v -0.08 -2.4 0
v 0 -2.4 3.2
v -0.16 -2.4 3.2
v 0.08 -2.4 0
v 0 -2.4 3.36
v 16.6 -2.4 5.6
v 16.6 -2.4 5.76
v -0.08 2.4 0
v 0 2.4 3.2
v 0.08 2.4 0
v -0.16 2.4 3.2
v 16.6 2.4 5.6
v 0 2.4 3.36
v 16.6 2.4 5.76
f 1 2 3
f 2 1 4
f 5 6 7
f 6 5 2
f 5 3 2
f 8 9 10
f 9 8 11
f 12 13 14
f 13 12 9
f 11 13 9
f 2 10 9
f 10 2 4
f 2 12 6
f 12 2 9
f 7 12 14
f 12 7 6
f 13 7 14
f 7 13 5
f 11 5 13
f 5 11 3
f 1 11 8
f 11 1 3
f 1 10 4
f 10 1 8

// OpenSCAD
// file: ../p/4-4edge.scad
use <../lib.scad>
$fa=1; $fs=0.2;
function ldraw_lib__4_4edge(realsolid=false) = [
// 0 Circle 1.0
// 0 Name: 4-4edge.dat
// 0 Author: James Jessiman
// 0 !LDRAW_ORG Primitive UPDATE 2017-01
// 0 !LICENSE Licensed under CC BY 2.0 and CC BY 4.0 : see CAreadme.txt
// 
// 0 BFC CERTIFY CCW
  [0,"BFC","CERTIFY"],
  [0,"BFC","CCW"],
// 
// 0 !HISTORY 1998-12-15 [PTadmin] Official Update 1998-10
// 0 !HISTORY 2005-12-28 [PTadmin] Official Update 2005-01
// 0 !HISTORY 2007-06-24 [PTadmin] Header formatted for Contributor Agreement
// 0 !HISTORY 2008-07-01 [PTadmin] Official Update 2008-01
// 0 !HISTORY 2017-01-15 [Steffen] BFCed
// 0 !HISTORY 2017-12-30 [PTadmin] Official Update 2017-01
// 
// 
// 2 24 1 0 0 0.9239 0 0.3827
  [2,24,1,0,0,0.9239,0,0.3827],
// 2 24 0.9239 0 0.3827 0.7071 0 0.7071
  [2,24,0.9239,0,0.3827,0.7071,0,0.7071],
// 2 24 0.7071 0 0.7071 0.3827 0 0.9239
  [2,24,0.7071,0,0.7071,0.3827,0,0.9239],
// 2 24 0.3827 0 0.9239 0 0 1
  [2,24,0.3827,0,0.9239,0,0,1],
// 2 24 0 0 1 -0.3827 0 0.9239
  [2,24,0,0,1,-0.3827,0,0.9239],
// 2 24 -0.3827 0 0.9239 -0.7071 0 0.7071
  [2,24,-0.3827,0,0.9239,-0.7071,0,0.7071],
// 2 24 -0.7071 0 0.7071 -0.9239 0 0.3827
  [2,24,-0.7071,0,0.7071,-0.9239,0,0.3827],
// 2 24 -0.9239 0 0.3827 -1 0 -0
  [2,24,-0.9239,0,0.3827,-1,0,-0],
// 2 24 -1 0 -0 -0.9239 0 -0.3827
  [2,24,-1,0,-0,-0.9239,0,-0.3827],
// 2 24 -0.9239 0 -0.3827 -0.7071 0 -0.7071
  [2,24,-0.9239,0,-0.3827,-0.7071,0,-0.7071],
// 2 24 -0.7071 0 -0.7071 -0.3827 0 -0.9239
  [2,24,-0.7071,0,-0.7071,-0.3827,0,-0.9239],
// 2 24 -0.3827 0 -0.9239 0 0 -1
  [2,24,-0.3827,0,-0.9239,0,0,-1],
// 2 24 0 0 -1 0.3827 0 -0.9239
  [2,24,0,0,-1,0.3827,0,-0.9239],
// 2 24 0.3827 0 -0.9239 0.7071 0 -0.7071
  [2,24,0.3827,0,-0.9239,0.7071,0,-0.7071],
// 2 24 0.7071 0 -0.7071 0.9239 0 -0.3827
  [2,24,0.7071,0,-0.7071,0.9239,0,-0.3827],
// 2 24 0.9239 0 -0.3827 1 0 0
  [2,24,0.9239,0,-0.3827,1,0,0],
];
module ldraw_lib__4_4edge(step=0, col=false, unit=2/5, alt=false, line=0.2, solid=!$preview)
    makepoly(ldraw_lib__4_4edge(solid), step=step, col=col, unit=unit, alt=alt, line=line, solid=solid);
ldraw_lib__4_4edge(line=0.2);
// file: ../p/4-4disc.scad
use <../lib.scad>
$fa=1; $fs=0.2;
function ldraw_lib__4_4disc(realsolid=false) = [
// 0 Disc 1.0
// 0 Name: 4-4disc.dat
// 0 Author: James Jessiman
// 0 !LDRAW_ORG Primitive UPDATE 2002-02
// 0 !LICENSE Licensed under CC BY 2.0 and CC BY 4.0 : see CAreadme.txt
// 
// 0 BFC CERTIFY CCW
  [0,"BFC","CERTIFY"],
  [0,"BFC","CCW"],
// 
// 0 !HISTORY 1998-12-15 [PTadmin] Official Update 1998-10
// 0 !HISTORY 2002-03-23 [sbliss] Added BFC statement
// 0 !HISTORY 2002-04-25 [PTadmin] Official Update 2002-02
// 0 !HISTORY 2007-06-24 [PTadmin] Header formatted for Contributor Agreement
// 0 !HISTORY 2008-07-01 [PTadmin] Official Update 2008-01
// 
// 
// 3 16 0 0 0 1 0 0 0.9239 0 0.3827
  [3,16,0,0,0,1,0,0,0.9239,0,0.3827],
// 3 16 0 0 0 0.9239 0 0.3827 0.7071 0 0.7071
  [3,16,0,0,0,0.9239,0,0.3827,0.7071,0,0.7071],
// 3 16 0 0 0 0.7071 0 0.7071 0.3827 0 0.9239
  [3,16,0,0,0,0.7071,0,0.7071,0.3827,0,0.9239],
// 3 16 0 0 0 0.3827 0 0.9239 0 0 1
  [3,16,0,0,0,0.3827,0,0.9239,0,0,1],
// 3 16 0 0 0 0 0 1 -0.3827 0 0.9239
  [3,16,0,0,0,0,0,1,-0.3827,0,0.9239],
// 3 16 0 0 0 -0.3827 0 0.9239 -0.7071 0 0.7071
  [3,16,0,0,0,-0.3827,0,0.9239,-0.7071,0,0.7071],
// 3 16 0 0 0 -0.7071 0 0.7071 -0.9239 0 0.3827
  [3,16,0,0,0,-0.7071,0,0.7071,-0.9239,0,0.3827],
// 3 16 0 0 0 -0.9239 0 0.3827 -1 0 -0
  [3,16,0,0,0,-0.9239,0,0.3827,-1,0,-0],
// 3 16 0 0 0 -1 0 -0 -0.9239 0 -0.3827
  [3,16,0,0,0,-1,0,-0,-0.9239,0,-0.3827],
// 3 16 0 0 0 -0.9239 0 -0.3827 -0.7071 0 -0.7071
  [3,16,0,0,0,-0.9239,0,-0.3827,-0.7071,0,-0.7071],
// 3 16 0 0 0 -0.7071 0 -0.7071 -0.3827 0 -0.9239
  [3,16,0,0,0,-0.7071,0,-0.7071,-0.3827,0,-0.9239],
// 3 16 0 0 0 -0.3827 0 -0.9239 0 0 -1
  [3,16,0,0,0,-0.3827,0,-0.9239,0,0,-1],
// 3 16 0 0 0 0 0 -1 0.3827 0 -0.9239
  [3,16,0,0,0,0,0,-1,0.3827,0,-0.9239],
// 3 16 0 0 0 0.3827 0 -0.9239 0.7071 0 -0.7071
  [3,16,0,0,0,0.3827,0,-0.9239,0.7071,0,-0.7071],
// 3 16 0 0 0 0.7071 0 -0.7071 0.9239 0 -0.3827
  [3,16,0,0,0,0.7071,0,-0.7071,0.9239,0,-0.3827],
// 3 16 0 0 0 0.9239 0 -0.3827 1 0 0
  [3,16,0,0,0,0.9239,0,-0.3827,1,0,0],
// 0
];
module ldraw_lib__4_4disc(step=0, col=false, unit=2/5, alt=false, line=0.2, solid=!$preview)
    makepoly(ldraw_lib__4_4disc(solid), step=step, col=col, unit=unit, alt=alt, line=line, solid=solid);
ldraw_lib__4_4disc(line=0.2);
// file: ../p/4-4cyli.scad
use <../lib.scad>
$fa=1; $fs=0.2;
function ldraw_lib__4_4cyli(realsolid=false) = [
// 0 Cylinder 1.0
// 0 Name: 4-4cyli.dat
// 0 Author: James Jessiman
// 0 !LDRAW_ORG Primitive UPDATE 2005-01
// 0 !LICENSE Licensed under CC BY 2.0 and CC BY 4.0 : see CAreadme.txt
// 
// 0 BFC CERTIFY CCW
  [0,"BFC","CERTIFY"],
  [0,"BFC","CCW"],
// 
// 0 !HISTORY 1998-12-15 [PTadmin] Official Update 1998-10
// 0 !HISTORY 2002-03-23 [sbliss] Added BFC statement; merged headers from files in distributions LDraw 0.27 and Complete.
// 0 !HISTORY 2002-04-25 [PTadmin] Official Update 2002-02
// 0 !HISTORY 2004-12-14 [guyvivan] BFC CCW
// 0 !HISTORY 2005-12-28 [PTadmin] Official Update 2005-01
// 0 !HISTORY 2007-06-24 [PTadmin] Header formatted for Contributor Agreement
// 0 !HISTORY 2008-07-01 [PTadmin] Official Update 2008-01
// 
// 
// 4 16 1 1 0 0.9239 1 0.3827 0.9239 0 0.3827 1 0 0
  [4,16,1,1,0,0.9239,1,0.3827,0.9239,0,0.3827,1,0,0],
// 5 24 1 0 0 1 1 0 0.9239 0 0.3827 0.9239 0 -0.3827
  [5,24,1,0,0,1,1,0,0.9239,0,0.3827,0.9239,0,-0.3827],
// 4 16 0.9239 1 0.3827 0.7071 1 0.7071 0.7071 0 0.7071 0.9239 0 0.3827
  [4,16,0.9239,1,0.3827,0.7071,1,0.7071,0.7071,0,0.7071,0.9239,0,0.3827],
// 5 24 0.9239 0 0.3827 0.9239 1 0.3827 0.7071 0 0.7071 1 0 0
  [5,24,0.9239,0,0.3827,0.9239,1,0.3827,0.7071,0,0.7071,1,0,0],
// 4 16 0.7071 1 0.7071 0.3827 1 0.9239 0.3827 0 0.9239 0.7071 0 0.7071
  [4,16,0.7071,1,0.7071,0.3827,1,0.9239,0.3827,0,0.9239,0.7071,0,0.7071],
// 5 24 0.7071 0 0.7071 0.7071 1 0.7071 0.3827 0 0.9239 0.9239 0 0.3827
  [5,24,0.7071,0,0.7071,0.7071,1,0.7071,0.3827,0,0.9239,0.9239,0,0.3827],
// 4 16 0.3827 1 0.9239 0 1 1 0 0 1 0.3827 0 0.9239
  [4,16,0.3827,1,0.9239,0,1,1,0,0,1,0.3827,0,0.9239],
// 5 24 0.3827 0 0.9239 0.3827 1 0.9239 0 0 1 0.7071 0 0.7071
  [5,24,0.3827,0,0.9239,0.3827,1,0.9239,0,0,1,0.7071,0,0.7071],
// 4 16 0 1 1 -0.3827 1 0.9239 -0.3827 0 0.9239 0 0 1
  [4,16,0,1,1,-0.3827,1,0.9239,-0.3827,0,0.9239,0,0,1],
// 5 24 0 0 1 0 1 1 -0.3827 0 0.9239 0.3827 0 0.9239
  [5,24,0,0,1,0,1,1,-0.3827,0,0.9239,0.3827,0,0.9239],
// 4 16 -0.3827 1 0.9239 -0.7071 1 0.7071 -0.7071 0 0.7071 -0.3827 0 0.9239
  [4,16,-0.3827,1,0.9239,-0.7071,1,0.7071,-0.7071,0,0.7071,-0.3827,0,0.9239],
// 5 24 -0.3827 0 0.9239 -0.3827 1 0.9239 -0.7071 0 0.7071 0 0 1
  [5,24,-0.3827,0,0.9239,-0.3827,1,0.9239,-0.7071,0,0.7071,0,0,1],
// 4 16 -0.7071 1 0.7071 -0.9239 1 0.3827 -0.9239 0 0.3827 -0.7071 0 0.7071
  [4,16,-0.7071,1,0.7071,-0.9239,1,0.3827,-0.9239,0,0.3827,-0.7071,0,0.7071],
// 5 24 -0.7071 0 0.7071 -0.7071 1 0.7071 -0.9239 0 0.3827 -0.3827 0 0.9239
  [5,24,-0.7071,0,0.7071,-0.7071,1,0.7071,-0.9239,0,0.3827,-0.3827,0,0.9239],
// 4 16 -0.9239 1 0.3827 -1 1 0 -1 0 0 -0.9239 0 0.3827
  [4,16,-0.9239,1,0.3827,-1,1,0,-1,0,0,-0.9239,0,0.3827],
// 5 24 -0.9239 0 0.3827 -0.9239 1 0.3827 -1 0 0 -0.7071 0 0.7071
  [5,24,-0.9239,0,0.3827,-0.9239,1,0.3827,-1,0,0,-0.7071,0,0.7071],
// 4 16 -1 1 0 -0.9239 1 -0.3827 -0.9239 0 -0.3827 -1 0 0
  [4,16,-1,1,0,-0.9239,1,-0.3827,-0.9239,0,-0.3827,-1,0,0],
// 5 24 -1 0 0 -1 1 0 -0.9239 0 -0.3827 -0.9239 0 0.3827
  [5,24,-1,0,0,-1,1,0,-0.9239,0,-0.3827,-0.9239,0,0.3827],
// 4 16 -0.9239 1 -0.3827 -0.7071 1 -0.7071 -0.7071 0 -0.7071 -0.9239 0 -0.3827
  [4,16,-0.9239,1,-0.3827,-0.7071,1,-0.7071,-0.7071,0,-0.7071,-0.9239,0,-0.3827],
// 5 24 -0.9239 0 -0.3827 -0.9239 1 -0.3827 -0.7071 0 -0.7071 -1 0 0
  [5,24,-0.9239,0,-0.3827,-0.9239,1,-0.3827,-0.7071,0,-0.7071,-1,0,0],
// 4 16 -0.7071 1 -0.7071 -0.3827 1 -0.9239 -0.3827 0 -0.9239 -0.7071 0 -0.7071
  [4,16,-0.7071,1,-0.7071,-0.3827,1,-0.9239,-0.3827,0,-0.9239,-0.7071,0,-0.7071],
// 5 24 -0.7071 0 -0.7071 -0.7071 1 -0.7071 -0.3827 0 -0.9239 -0.9239 0 -0.3827
  [5,24,-0.7071,0,-0.7071,-0.7071,1,-0.7071,-0.3827,0,-0.9239,-0.9239,0,-0.3827],
// 4 16 -0.3827 1 -0.9239 0 1 -1 0 0 -1 -0.3827 0 -0.9239
  [4,16,-0.3827,1,-0.9239,0,1,-1,0,0,-1,-0.3827,0,-0.9239],
// 5 24 -0.3827 0 -0.9239 -0.3827 1 -0.9239 0 0 -1 -0.7071 0 -0.7071
  [5,24,-0.3827,0,-0.9239,-0.3827,1,-0.9239,0,0,-1,-0.7071,0,-0.7071],
// 4 16 0 1 -1 0.3827 1 -0.9239 0.3827 0 -0.9239 0 0 -1
  [4,16,0,1,-1,0.3827,1,-0.9239,0.3827,0,-0.9239,0,0,-1],
// 5 24 0 0 -1 0 1 -1 0.3827 0 -0.9239 -0.3827 0 -0.9239
  [5,24,0,0,-1,0,1,-1,0.3827,0,-0.9239,-0.3827,0,-0.9239],
// 4 16 0.3827 1 -0.9239 0.7071 1 -0.7071 0.7071 0 -0.7071 0.3827 0 -0.9239
  [4,16,0.3827,1,-0.9239,0.7071,1,-0.7071,0.7071,0,-0.7071,0.3827,0,-0.9239],
// 5 24 0.3827 0 -0.9239 0.3827 1 -0.9239 0.7071 0 -0.7071 0 0 -1
  [5,24,0.3827,0,-0.9239,0.3827,1,-0.9239,0.7071,0,-0.7071,0,0,-1],
// 4 16 0.7071 1 -0.7071 0.9239 1 -0.3827 0.9239 0 -0.3827 0.7071 0 -0.7071
  [4,16,0.7071,1,-0.7071,0.9239,1,-0.3827,0.9239,0,-0.3827,0.7071,0,-0.7071],
// 5 24 0.7071 0 -0.7071 0.7071 1 -0.7071 0.9239 0 -0.3827 0.3827 0 -0.9239
  [5,24,0.7071,0,-0.7071,0.7071,1,-0.7071,0.9239,0,-0.3827,0.3827,0,-0.9239],
// 4 16 0.9239 1 -0.3827 1 1 0 1 0 0 0.9239 0 -0.3827
  [4,16,0.9239,1,-0.3827,1,1,0,1,0,0,0.9239,0,-0.3827],
// 5 24 0.9239 0 -0.3827 0.9239 1 -0.3827 1 0 0 0.7071 0 -0.7071
  [5,24,0.9239,0,-0.3827,0.9239,1,-0.3827,1,0,0,0.7071,0,-0.7071],
// 0
];
module ldraw_lib__4_4cyli(step=0, col=false, unit=2/5, alt=false, line=0.2, solid=!$preview)
    makepoly(ldraw_lib__4_4cyli(solid), step=step, col=col, unit=unit, alt=alt, line=line, solid=solid);
ldraw_lib__4_4cyli(line=0.2);
// file: ../p/stud3.scad
use <../lib.scad>
use <4-4cyli.scad>
use <4-4disc.scad>
use <4-4edge.scad>
$fa=1; $fs=0.2;
function ldraw_lib__stud3(realsolid=false) = realsolid ? 
    [openscad(translate([0,0,-eps()], o=cylinder(4+eps(), r=4)),2)] : [
// 0 Stud Tube Solid
// 0 Name: stud3.dat
// 0 Author: James Jessiman
// 0 !LDRAW_ORG Primitive UPDATE 2012-01
// 0 !LICENSE Licensed under CC BY 2.0 and CC BY 4.0 : see CAreadme.txt
// 
// 0 BFC CERTIFY CCW
  [0,"BFC","CERTIFY"],
  [0,"BFC","CCW"],
// 
// 0 !HISTORY 2002-04-04 [sbliss] Modified for BFC compliance
// 0 !HISTORY 2002-04-25 [PTadmin] Official Update 2002-02
// 0 !HISTORY 2007-06-24 [PTadmin] Header formatted for Contributor Agreement
// 0 !HISTORY 2008-07-01 [PTadmin] Official Update 2008-01
// 0 !HISTORY 2012-02-16 [Philo] Changed to CCW
// 0 !HISTORY 2012-03-30 [PTadmin] Official Update 2012-01
// 
// 
// 1 16 0 -4 0 4 0 0 0 1 0 0 0 4 4-4edge.dat
  [1,16,0,-4,0,4,0,0,0,1,0,0,0,4, ldraw_lib__4_4edge(realsolid)],
// 1 16 0 0 0 4 0 0 0 1 0 0 0 4 4-4edge.dat
  [1,16,0,0,0,4,0,0,0,1,0,0,0,4, ldraw_lib__4_4edge(realsolid)],
// 1 16 0 -4 0 4 0 0 0 1 0 0 0 4 4-4disc.dat
  [1,16,0,-4,0,4,0,0,0,1,0,0,0,4, ldraw_lib__4_4disc(realsolid)],
// 1 16 0 -4 0 4 0 0 0 4 0 0 0 4 4-4cyli.dat
  [1,16,0,-4,0,4,0,0,0,4,0,0,0,4, ldraw_lib__4_4cyli(realsolid)],
];
module ldraw_lib__stud3(step=0, col=false, unit=2/5, alt=false, line=0.2, solid=!$preview)
    makepoly(ldraw_lib__stud3(solid), step=step, col=col, unit=unit, alt=alt, line=line, solid=solid);
ldraw_lib__stud3(line=0.2);
// file: ../p/stud.scad
use <../lib.scad>
use <4-4cyli.scad>
use <4-4disc.scad>
use <4-4edge.scad>
$fa=1; $fs=0.2;
function ldraw_lib__stud(realsolid=false) = realsolid ? 
    [openscad(translate([0,0,-eps()], o=cylinder(4+eps(), r=6)),2)] : [
// 0 Stud
// 0 Name: stud.dat
// 0 Author: James Jessiman
// 0 !LDRAW_ORG Primitive UPDATE 2012-01
// 0 !LICENSE Licensed under CC BY 2.0 and CC BY 4.0 : see CAreadme.txt
// 
// 0 BFC CERTIFY CCW
  [0,"BFC","CERTIFY"],
  [0,"BFC","CCW"],
// 
// 0 !HISTORY 2002-04-04 [sbliss] Modified for BFC compliance
// 0 !HISTORY 2002-04-25 [PTadmin] Official Update 2002-02
// 0 !HISTORY 2007-06-24 [PTadmin] Header formatted for Contributor Agreement
// 0 !HISTORY 2008-07-01 [PTadmin] Official Update 2008-01
// 0 !HISTORY 2012-02-16 [Philo] Changed to CCW
// 0 !HISTORY 2012-03-30 [PTadmin] Official Update 2012-01
// 
// 
// 1 16 0 0 0 6 0 0 0 1 0 0 0 6 4-4edge.dat
  [1,16,0,0,0,6,0,0,0,1,0,0,0,6, ldraw_lib__4_4edge(realsolid)],
// 1 16 0 -4 0 6 0 0 0 1 0 0 0 6 4-4edge.dat
  [1,16,0,-4,0,6,0,0,0,1,0,0,0,6, ldraw_lib__4_4edge(realsolid)],
// 1 16 0 0 0 6 0 0 0 -4 0 0 0 6 4-4cyli.dat
  [1,16,0,0,0,6,0,0,0,-4,0,0,0,6, ldraw_lib__4_4cyli(realsolid)],
// 1 16 0 -4 0 6 0 0 0 1 0 0 0 6 4-4disc.dat
  [1,16,0,-4,0,6,0,0,0,1,0,0,0,6, ldraw_lib__4_4disc(realsolid)],
];
module ldraw_lib__stud(step=0, col=false, unit=2/5, alt=false, line=0.2, solid=!$preview)
    makepoly(ldraw_lib__stud(solid), step=step, col=col, unit=unit, alt=alt, line=line, solid=solid);
ldraw_lib__stud(line=0.2);
// file: ../p/box5.scad
use <../lib.scad>
$fa=1; $fs=0.2;
function ldraw_lib__box5(realsolid=false) = [
// 0 Box with 5 Faces and All Edges
// 0 Name: box5.dat
// 0 Author: James Jessiman
// 0 !LDRAW_ORG Primitive UPDATE 2012-01
// 0 !LICENSE Licensed under CC BY 2.0 and CC BY 4.0 : see CAreadme.txt
// 
// 0 BFC CERTIFY CCW
  [0,"BFC","CERTIFY"],
  [0,"BFC","CCW"],
// 
// 0 !HISTORY 2002-04-03 [sbliss] Modified for BFC compliance
// 0 !HISTORY 2002-04-25 [PTadmin] Official Update 2002-02
// 0 !HISTORY 2007-06-24 [PTadmin] Header formatted for Contributor Agreement
// 0 !HISTORY 2008-07-01 [PTadmin] Official Update 2008-01
// 0 !HISTORY 2012-02-16 [Philo] Changed to CCW
// 0 !HISTORY 2012-03-30 [PTadmin] Official Update 2012-01
// 
// 
// 2 24 1 1 1 -1 1 1
  [2,24,1,1,1,-1,1,1],
// 2 24 -1 1 1 -1 1 -1
  [2,24,-1,1,1,-1,1,-1],
// 2 24 -1 1 -1 1 1 -1
  [2,24,-1,1,-1,1,1,-1],
// 2 24 1 1 -1 1 1 1
  [2,24,1,1,-1,1,1,1],
// 2 24 1 0 1 -1 0 1
  [2,24,1,0,1,-1,0,1],
// 2 24 -1 0 1 -1 0 -1
  [2,24,-1,0,1,-1,0,-1],
// 2 24 -1 0 -1 1 0 -1
  [2,24,-1,0,-1,1,0,-1],
// 2 24 1 0 -1 1 0 1
  [2,24,1,0,-1,1,0,1],
// 2 24 1 0 1 1 1 1
  [2,24,1,0,1,1,1,1],
// 2 24 -1 0 1 -1 1 1
  [2,24,-1,0,1,-1,1,1],
// 2 24 1 0 -1 1 1 -1
  [2,24,1,0,-1,1,1,-1],
// 2 24 -1 0 -1 -1 1 -1
  [2,24,-1,0,-1,-1,1,-1],
// 4 16 -1 1 1 1 1 1 1 1 -1 -1 1 -1
  [4,16,-1,1,1,1,1,1,1,1,-1,-1,1,-1],
// 4 16 -1 1 1 -1 0 1 1 0 1 1 1 1
  [4,16,-1,1,1,-1,0,1,1,0,1,1,1,1],
// 4 16 -1 1 -1 -1 0 -1 -1 0 1 -1 1 1
  [4,16,-1,1,-1,-1,0,-1,-1,0,1,-1,1,1],
// 4 16 1 1 -1 1 0 -1 -1 0 -1 -1 1 -1
  [4,16,1,1,-1,1,0,-1,-1,0,-1,-1,1,-1],
// 4 16 1 1 1 1 0 1 1 0 -1 1 1 -1
  [4,16,1,1,1,1,0,1,1,0,-1,1,1,-1],
];
module ldraw_lib__box5(step=0, col=false, unit=2/5, alt=false, line=0.2, solid=!$preview)
    makepoly(ldraw_lib__box5(solid), step=step, col=col, unit=unit, alt=alt, line=line, solid=solid);
ldraw_lib__box5(line=0.2);
// file: ../p/box4t.scad
use <../lib.scad>
$fa=1; $fs=0.2;
function ldraw_lib__box4t(realsolid=false) = [
// 0 Box with 4 Adjacent Faces and All Edges
// 0 Name: box4t.dat
// 0 Author: Tore Eriksson [Tore_Eriksson]
// 0 !LDRAW_ORG Primitive UPDATE 2003-02
// 0 !LICENSE Licensed under CC BY 2.0 and CC BY 4.0 : see CAreadme.txt
// 
// 0 BFC CERTIFY CCW
  [0,"BFC","CERTIFY"],
  [0,"BFC","CCW"],
// 
// 0 !HISTORY 1997-09-29 [PTadmin] Official Update 1997-15
// 0 !HISTORY 2002-08-31 [izanette] Modified with WINDZ for BFC compliance
// 0 !HISTORY 2003-08-01 [PTadmin] Official Update 2003-02
// 0 !HISTORY 2007-06-24 [PTadmin] Header formatted for Contributor Agreement
// 0 !HISTORY 2008-07-01 [PTadmin] Official Update 2008-01
// 
// 
// 2 24 1 1 1 -1 1 1
  [2,24,1,1,1,-1,1,1],
// 2 24 -1 1 1 -1 1 -1
  [2,24,-1,1,1,-1,1,-1],
// 2 24 -1 1 -1 1 1 -1
  [2,24,-1,1,-1,1,1,-1],
// 2 24 1 1 -1 1 1 1
  [2,24,1,1,-1,1,1,1],
// 2 24 1 0 1 -1 0 1
  [2,24,1,0,1,-1,0,1],
// 2 24 -1 0 1 -1 0 -1
  [2,24,-1,0,1,-1,0,-1],
// 2 24 -1 0 -1 1 0 -1
  [2,24,-1,0,-1,1,0,-1],
// 2 24 1 0 -1 1 0 1
  [2,24,1,0,-1,1,0,1],
// 2 24 1 0 1 1 1 1
  [2,24,1,0,1,1,1,1],
// 2 24 -1 0 1 -1 1 1
  [2,24,-1,0,1,-1,1,1],
// 2 24 1 0 -1 1 1 -1
  [2,24,1,0,-1,1,1,-1],
// 2 24 -1 0 -1 -1 1 -1
  [2,24,-1,0,-1,-1,1,-1],
// 4 16 1 1 1 1 1 -1 -1 1 -1 -1 1 1
  [4,16,1,1,1,1,1,-1,-1,1,-1,-1,1,1],
// 4 16 1 1 1 -1 1 1 -1 0 1 1 0 1
  [4,16,1,1,1,-1,1,1,-1,0,1,1,0,1],
// 4 16 -1 1 1 -1 1 -1 -1 0 -1 -1 0 1
  [4,16,-1,1,1,-1,1,-1,-1,0,-1,-1,0,1],
// 0 4 16 -1 1 -1 -1 0 -1 1 0 -1 1 1 -1
// 4 16 1 1 -1 1 1 1 1 0 1 1 0 -1
  [4,16,1,1,-1,1,1,1,1,0,1,1,0,-1],
// 0
];
module ldraw_lib__box4t(step=0, col=false, unit=2/5, alt=false, line=0.2, solid=!$preview)
    makepoly(ldraw_lib__box4t(solid), step=step, col=col, unit=unit, alt=alt, line=line, solid=solid);
ldraw_lib__box4t(line=0.2);
// file: s/3004s01.scad
use <../../lib.scad>
use <../../p/box4t.scad>
use <../../p/box5.scad>
use <../../p/stud.scad>
use <../../p/stud3.scad>
$fa=1; $fs=0.2;
function ldraw_lib__s__3004s01(realsolid=false) = [
// 0 ~Brick  1 x  2 without Front Face
// 0 Name: s\3004s01.dat
// 0 Author: James Jessiman
// 0 !LDRAW_ORG Subpart UPDATE 2003-03
// 0 !LICENSE Licensed under CC BY 2.0 and CC BY 4.0 : see CAreadme.txt
// 
// 0 BFC CERTIFY CCW
  [0,"BFC","CERTIFY"],
  [0,"BFC","CCW"],
// 
// 0 !HISTORY 2003-09-07 [jriley] Subfiling, BFC
// 0 !HISTORY 2003-12-19 [PTadmin] Official Update 2003-03
// 0 !HISTORY 2007-08-29 [PTadmin] Header formatted for Contributor Agreement
// 0 !HISTORY 2008-07-01 [PTadmin] Official Update 2008-01
// 
// 
// 1 16 0 4 0 1 0 0 0 -5 0 0 0 1 stud3.dat
  [1,16,0,4,0,1,0,0,0,-5,0,0,0,1, ldraw_lib__stud3(realsolid)],
// 0 BFC INVERTNEXT
  [0,"BFC","INVERTNEXT"],
// 1 16 0 24 0 16 0 0 0 -20 0 0 0 6 box5.dat
  [1,16,0,24,0,16,0,0,0,-20,0,0,0,6, ldraw_lib__box5(realsolid)],
// 4 16 20 24 10 16 24 6 -16 24 6 -20 24 10
  [4,16,20,24,10,16,24,6,-16,24,6,-20,24,10],
// 4 16 -20 24 10 -16 24 6 -16 24 -6 -20 24 -10
  [4,16,-20,24,10,-16,24,6,-16,24,-6,-20,24,-10],
// 4 16 -20 24 -10 -16 24 -6 16 24 -6 20 24 -10
  [4,16,-20,24,-10,-16,24,-6,16,24,-6,20,24,-10],
// 4 16 20 24 -10 16 24 -6 16 24 6 20 24 10
  [4,16,20,24,-10,16,24,-6,16,24,6,20,24,10],
// 1 16 0 24 0 20 0 0 0 -24 0 0 0 10 box4t.dat
  [1,16,0,24,0,20,0,0,0,-24,0,0,0,10, ldraw_lib__box4t(realsolid)],
// 1 16 10 0 0 1 0 0 0 1 0 0 0 1 stud.dat
  [1,16,10,0,0,1,0,0,0,1,0,0,0,1, ldraw_lib__stud(realsolid)],
// 1 16 -10 0 0 1 0 0 0 1 0 0 0 1 stud.dat
  [1,16,-10,0,0,1,0,0,0,1,0,0,0,1, ldraw_lib__stud(realsolid)],
// 0
];
module ldraw_lib__s__3004s01(step=0, col=false, unit=2/5, alt=false, line=0.2, solid=!$preview)
    makepoly(ldraw_lib__s__3004s01(solid), step=step, col=col, unit=unit, alt=alt, line=line, solid=solid);
ldraw_lib__s__3004s01(line=0.2);
// file: 3004.scad
use <../lib.scad>
use <s/3004s01.scad>
$fa=1; $fs=0.2;
function ldraw_lib__3004(realsolid=false) = [
// 0 Brick  1 x  2
// 0 Name: 3004.dat
// 0 Author: James Jessiman
// 0 !LDRAW_ORG Part UPDATE 2022-05
// 0 !LICENSE Licensed under CC BY 2.0 and CC BY 4.0 : see CAreadme.txt
// 
// 0 BFC CERTIFY CCW
  [0,"BFC","CERTIFY"],
  [0,"BFC","CCW"],
// 
// 0 !HISTORY 2001-10-26 [PTadmin] Official Update 2001-01
// 0 !HISTORY 2002-05-07 {unknown} BFC Certification
// 0 !HISTORY 2002-06-11 [PTadmin] Official Update 2002-03
// 0 !HISTORY 2007-05-07 [PTadmin] Header formatted for Contributor Agreement
// 0 !HISTORY 2008-07-01 [PTadmin] Official Update 2008-01
// 0 !HISTORY 2022-08-04 [MagFors] Using subfile
// 0 !HISTORY 2022-09-15 [PTadmin] Official Update 2022-05
// 
// 
// 1 16 0 0 0 1 0 0 0 1 0 0 0 1 s\3004s01.dat
  [1,16,0,0,0,1,0,0,0,1,0,0,0,1, ldraw_lib__s__3004s01(realsolid)],
// 4 16 -20 24 -10 20 24 -10 20 0 -10 -20 0 -10
  [4,16,-20,24,-10,20,24,-10,20,0,-10,-20,0,-10],
];
module ldraw_lib__3004(step=0, col=false, unit=2/5, alt=false, line=0.2, solid=!$preview)
    makepoly(ldraw_lib__3004(solid), step=step, col=col, unit=unit, alt=alt, line=line, solid=solid);
ldraw_lib__3004(line=0.2);
// file: ../p/rect3.scad
use <../lib.scad>
$fa=1; $fs=0.2;
function ldraw_lib__rect3(realsolid=false) = [
// 0 Rectangle with 3 Edges
// 0 Name: rect3.dat
// 0 Author: Mark Kennedy [mkennedy]
// 0 !LDRAW_ORG Primitive UPDATE 2010-01
// 0 !LICENSE Licensed under CC BY 2.0 and CC BY 4.0 : see CAreadme.txt
// 
// 0 BFC CERTIFY CCW
  [0,"BFC","CERTIFY"],
  [0,"BFC","CCW"],
// 
// 0 !HISTORY 2003-08-01 [PTadmin] Official Update 2003-02
// 0 !HISTORY 2007-06-24 [PTadmin] Header formatted for Contributor Agreement
// 0 !HISTORY 2008-07-01 [PTadmin] Official Update 2008-01
// 0 !HISTORY 2010-01-17 [mikeheide] Change winding to CCW
// 0 !HISTORY 2010-04-05 [PTadmin] Official Update 2010-01
// 
// 
// 2 24 1 0 1 -1 0 1
  [2,24,1,0,1,-1,0,1],
// 2 24 1 0 1 1 0 -1
  [2,24,1,0,1,1,0,-1],
// 2 24 -1 0 1 -1 0 -1
  [2,24,-1,0,1,-1,0,-1],
// 4 16 -1 0 1 -1 0 -1 1 0 -1 1 0 1
  [4,16,-1,0,1,-1,0,-1,1,0,-1,1,0,1],
// 0 //
];
module ldraw_lib__rect3(step=0, col=false, unit=2/5, alt=false, line=0.2, solid=!$preview)
    makepoly(ldraw_lib__rect3(solid), step=step, col=col, unit=unit, alt=alt, line=line, solid=solid);
ldraw_lib__rect3(line=0.2);
// file: ../p/rect2p.scad
use <../lib.scad>
$fa=1; $fs=0.2;
function ldraw_lib__rect2p(realsolid=false) = [
// 0 Rectangle with 2 Parallel Edges
// 0 Name: rect2p.dat
// 0 Author: Donald Sutter [technog]
// 0 !LDRAW_ORG Primitive UPDATE 2010-01
// 0 !LICENSE Licensed under CC BY 2.0 and CC BY 4.0 : see CAreadme.txt
// 
// 0 BFC CERTIFY CCW
  [0,"BFC","CERTIFY"],
  [0,"BFC","CCW"],
// 
// 0 !HISTORY 2003-08-01 [PTadmin] Official Update 2003-02
// 0 !HISTORY 2007-06-24 [PTadmin] Header formatted for Contributor Agreement
// 0 !HISTORY 2008-07-01 [PTadmin] Official Update 2008-01
// 0 !HISTORY 2010-01-17 [mikeheide] changed winding to CCW
// 0 !HISTORY 2010-04-05 [PTadmin] Official Update 2010-01
// 
// 
// 2 24 1 0 1 -1 0 1
  [2,24,1,0,1,-1,0,1],
// 2 24 -1 0 -1 1 0 -1
  [2,24,-1,0,-1,1,0,-1],
// 4 16 -1 0 1 -1 0 -1 1 0 -1 1 0 1
  [4,16,-1,0,1,-1,0,-1,1,0,-1,1,0,1],
// 0
];
module ldraw_lib__rect2p(step=0, col=false, unit=2/5, alt=false, line=0.2, solid=!$preview)
    makepoly(ldraw_lib__rect2p(solid), step=step, col=col, unit=unit, alt=alt, line=line, solid=solid);
ldraw_lib__rect2p(line=0.2);
// file: ../p/rect1.scad
use <../lib.scad>
$fa=1; $fs=0.2;
function ldraw_lib__rect1(realsolid=false) = [
// 0 Rectangle with 1 Edge
// 0 Name: rect1.dat
// 0 Author: Chris Dee [cwdee]
// 0 !LDRAW_ORG Primitive UPDATE 2010-01
// 0 !LICENSE Licensed under CC BY 2.0 and CC BY 4.0 : see CAreadme.txt
// 
// 0 BFC CERTIFY CCW
  [0,"BFC","CERTIFY"],
  [0,"BFC","CCW"],
// 
// 0 !HISTORY 2003-12-19 [PTadmin] Official Update 2003-03
// 0 !HISTORY 2007-06-24 [PTadmin] Header formatted for Contributor Agreement
// 0 !HISTORY 2008-07-01 [PTadmin] Official Update 2008-01
// 0 !HISTORY 2010-01-17 [mikeheide] changed winding to CCW
// 0 !HISTORY 2010-04-05 [PTadmin] Official Update 2010-01
// 
// 
// 2 24 1 0 -1 1 0 1
  [2,24,1,0,-1,1,0,1],
// 4 16 -1 0 1 -1 0 -1 1 0 -1 1 0 1
  [4,16,-1,0,1,-1,0,-1,1,0,-1,1,0,1],
// 0
];
module ldraw_lib__rect1(step=0, col=false, unit=2/5, alt=false, line=0.2, solid=!$preview)
    makepoly(ldraw_lib__rect1(solid), step=step, col=col, unit=unit, alt=alt, line=line, solid=solid);
ldraw_lib__rect1(line=0.2);
// main file
use <../lib.scad>
use <../p/rect1.scad>
use <../p/rect2p.scad>
use <../p/rect3.scad>
$fa=1; $fs=0.2;
function ldraw_lib__t1068(realsolid=false) = [
// 0 ~| Circuit Cubes NO/NC Switch Lever
// 0 Name: t1068.dat
// 0 Author: Philippe Hurbain [Philo]
// 0 !LDRAW_ORG Part UPDATE 2022-05
// 0 !LICENSE Licensed under CC BY 2.0 and CC BY 4.0 : see CAreadme.txt
// 
// 0 BFC CERTIFY CCW
  [0,"BFC","CERTIFY"],
  [0,"BFC","CCW"],
// 
// 0 !CATEGORY Electric
// 
// 0 !HISTORY 2022-09-15 [PTadmin] Official Update 2022-05
// 
// 
// 1 16 -0.1 -4 -6 -0.2 0 0.1 0 0 4 0 1 0 rect3.dat
  [1,16,-0.1,-4,-6,-0.2,0,0.1,0,0,4,0,1,0, ldraw_lib__rect3(realsolid)],
// 1 16 20.75 -11.2 -6 0 0 20.75 0.2 0 -3 0 1 0 rect3.dat
  [1,16,20.75,-11.2,-6,0,0,20.75,0.2,0,-3,0,1,0, ldraw_lib__rect3(realsolid)],
// 3 16 0 -8.4 -6 -0.4 -8 -6 0 -8 -6
  [3,16,0,-8.4,-6,-0.4,-8,-6,0,-8,-6],
// 1 16 -0.1 -4 6 0.2 0 0.1 0 0 4 0 -1 0 rect3.dat
  [1,16,-0.1,-4,6,0.2,0,0.1,0,0,4,0,-1,0, ldraw_lib__rect3(realsolid)],
// 1 16 20.75 -11.2 6 0 0 20.75 -0.2 0 -3 0 -1 0 rect3.dat
  [1,16,20.75,-11.2,6,0,0,20.75,-0.2,0,-3,0,-1,0, ldraw_lib__rect3(realsolid)],
// 3 16 -0.4 -8 6 0 -8.4 6 0 -8 6
  [3,16,-0.4,-8,6,0,-8.4,6,0,-8,6],
// 1 16 0.1 -4 0 0 -1 0.1 0 0 4 -6 0 0 rect2p.dat
  [1,16,0.1,-4,0,0,-1,0.1,0,0,4,-6,0,0, ldraw_lib__rect2p(realsolid)],
// 1 16 20.75 -11 0 20.75 0 0 -3 -1 0 0 0 -6 rect1.dat
  [1,16,20.75,-11,0,20.75,0,0,-3,-1,0,0,0,-6, ldraw_lib__rect1(realsolid)],
// 1 16 41.5 -14.2 0 0 -1 0 -0.2 0 0 0 0 -6 rect1.dat
  [1,16,41.5,-14.2,0,0,-1,0,-0.2,0,0,0,0,-6, ldraw_lib__rect1(realsolid)],
// 1 16 20.75 -11.4 0 -20.75 0 0 3 1 0 0 0 -6 rect1.dat
  [1,16,20.75,-11.4,0,-20.75,0,0,3,1,0,0,0,-6, ldraw_lib__rect1(realsolid)],
// 1 16 -0.2 -8.2 0 0 1 -0.2 0 0 0.2 6 0 0 rect3.dat
  [1,16,-0.2,-8.2,0,0,1,-0.2,0,0,0.2,6,0,0, ldraw_lib__rect3(realsolid)],
// 1 16 -0.3 -4 0 0.1 1 0 4 0 0 0 0 -6 rect1.dat
  [1,16,-0.3,-4,0,0.1,1,0,4,0,0,0,0,-6, ldraw_lib__rect1(realsolid)],
// 4 16 0.2 0 6 0.2 0 -6 -0.2 0 -6 -0.2 0 6
  [4,16,0.2,0,6,0.2,0,-6,-0.2,0,-6,-0.2,0,6],
];
module ldraw_lib__t1068(step=0, col=false, unit=2/5, alt=false, line=0.2, solid=!$preview)
    makepoly(ldraw_lib__t1068(solid), step=step, col=col, unit=unit, alt=alt, line=line, solid=solid);
ldraw_lib__t1068(line=0.2);
